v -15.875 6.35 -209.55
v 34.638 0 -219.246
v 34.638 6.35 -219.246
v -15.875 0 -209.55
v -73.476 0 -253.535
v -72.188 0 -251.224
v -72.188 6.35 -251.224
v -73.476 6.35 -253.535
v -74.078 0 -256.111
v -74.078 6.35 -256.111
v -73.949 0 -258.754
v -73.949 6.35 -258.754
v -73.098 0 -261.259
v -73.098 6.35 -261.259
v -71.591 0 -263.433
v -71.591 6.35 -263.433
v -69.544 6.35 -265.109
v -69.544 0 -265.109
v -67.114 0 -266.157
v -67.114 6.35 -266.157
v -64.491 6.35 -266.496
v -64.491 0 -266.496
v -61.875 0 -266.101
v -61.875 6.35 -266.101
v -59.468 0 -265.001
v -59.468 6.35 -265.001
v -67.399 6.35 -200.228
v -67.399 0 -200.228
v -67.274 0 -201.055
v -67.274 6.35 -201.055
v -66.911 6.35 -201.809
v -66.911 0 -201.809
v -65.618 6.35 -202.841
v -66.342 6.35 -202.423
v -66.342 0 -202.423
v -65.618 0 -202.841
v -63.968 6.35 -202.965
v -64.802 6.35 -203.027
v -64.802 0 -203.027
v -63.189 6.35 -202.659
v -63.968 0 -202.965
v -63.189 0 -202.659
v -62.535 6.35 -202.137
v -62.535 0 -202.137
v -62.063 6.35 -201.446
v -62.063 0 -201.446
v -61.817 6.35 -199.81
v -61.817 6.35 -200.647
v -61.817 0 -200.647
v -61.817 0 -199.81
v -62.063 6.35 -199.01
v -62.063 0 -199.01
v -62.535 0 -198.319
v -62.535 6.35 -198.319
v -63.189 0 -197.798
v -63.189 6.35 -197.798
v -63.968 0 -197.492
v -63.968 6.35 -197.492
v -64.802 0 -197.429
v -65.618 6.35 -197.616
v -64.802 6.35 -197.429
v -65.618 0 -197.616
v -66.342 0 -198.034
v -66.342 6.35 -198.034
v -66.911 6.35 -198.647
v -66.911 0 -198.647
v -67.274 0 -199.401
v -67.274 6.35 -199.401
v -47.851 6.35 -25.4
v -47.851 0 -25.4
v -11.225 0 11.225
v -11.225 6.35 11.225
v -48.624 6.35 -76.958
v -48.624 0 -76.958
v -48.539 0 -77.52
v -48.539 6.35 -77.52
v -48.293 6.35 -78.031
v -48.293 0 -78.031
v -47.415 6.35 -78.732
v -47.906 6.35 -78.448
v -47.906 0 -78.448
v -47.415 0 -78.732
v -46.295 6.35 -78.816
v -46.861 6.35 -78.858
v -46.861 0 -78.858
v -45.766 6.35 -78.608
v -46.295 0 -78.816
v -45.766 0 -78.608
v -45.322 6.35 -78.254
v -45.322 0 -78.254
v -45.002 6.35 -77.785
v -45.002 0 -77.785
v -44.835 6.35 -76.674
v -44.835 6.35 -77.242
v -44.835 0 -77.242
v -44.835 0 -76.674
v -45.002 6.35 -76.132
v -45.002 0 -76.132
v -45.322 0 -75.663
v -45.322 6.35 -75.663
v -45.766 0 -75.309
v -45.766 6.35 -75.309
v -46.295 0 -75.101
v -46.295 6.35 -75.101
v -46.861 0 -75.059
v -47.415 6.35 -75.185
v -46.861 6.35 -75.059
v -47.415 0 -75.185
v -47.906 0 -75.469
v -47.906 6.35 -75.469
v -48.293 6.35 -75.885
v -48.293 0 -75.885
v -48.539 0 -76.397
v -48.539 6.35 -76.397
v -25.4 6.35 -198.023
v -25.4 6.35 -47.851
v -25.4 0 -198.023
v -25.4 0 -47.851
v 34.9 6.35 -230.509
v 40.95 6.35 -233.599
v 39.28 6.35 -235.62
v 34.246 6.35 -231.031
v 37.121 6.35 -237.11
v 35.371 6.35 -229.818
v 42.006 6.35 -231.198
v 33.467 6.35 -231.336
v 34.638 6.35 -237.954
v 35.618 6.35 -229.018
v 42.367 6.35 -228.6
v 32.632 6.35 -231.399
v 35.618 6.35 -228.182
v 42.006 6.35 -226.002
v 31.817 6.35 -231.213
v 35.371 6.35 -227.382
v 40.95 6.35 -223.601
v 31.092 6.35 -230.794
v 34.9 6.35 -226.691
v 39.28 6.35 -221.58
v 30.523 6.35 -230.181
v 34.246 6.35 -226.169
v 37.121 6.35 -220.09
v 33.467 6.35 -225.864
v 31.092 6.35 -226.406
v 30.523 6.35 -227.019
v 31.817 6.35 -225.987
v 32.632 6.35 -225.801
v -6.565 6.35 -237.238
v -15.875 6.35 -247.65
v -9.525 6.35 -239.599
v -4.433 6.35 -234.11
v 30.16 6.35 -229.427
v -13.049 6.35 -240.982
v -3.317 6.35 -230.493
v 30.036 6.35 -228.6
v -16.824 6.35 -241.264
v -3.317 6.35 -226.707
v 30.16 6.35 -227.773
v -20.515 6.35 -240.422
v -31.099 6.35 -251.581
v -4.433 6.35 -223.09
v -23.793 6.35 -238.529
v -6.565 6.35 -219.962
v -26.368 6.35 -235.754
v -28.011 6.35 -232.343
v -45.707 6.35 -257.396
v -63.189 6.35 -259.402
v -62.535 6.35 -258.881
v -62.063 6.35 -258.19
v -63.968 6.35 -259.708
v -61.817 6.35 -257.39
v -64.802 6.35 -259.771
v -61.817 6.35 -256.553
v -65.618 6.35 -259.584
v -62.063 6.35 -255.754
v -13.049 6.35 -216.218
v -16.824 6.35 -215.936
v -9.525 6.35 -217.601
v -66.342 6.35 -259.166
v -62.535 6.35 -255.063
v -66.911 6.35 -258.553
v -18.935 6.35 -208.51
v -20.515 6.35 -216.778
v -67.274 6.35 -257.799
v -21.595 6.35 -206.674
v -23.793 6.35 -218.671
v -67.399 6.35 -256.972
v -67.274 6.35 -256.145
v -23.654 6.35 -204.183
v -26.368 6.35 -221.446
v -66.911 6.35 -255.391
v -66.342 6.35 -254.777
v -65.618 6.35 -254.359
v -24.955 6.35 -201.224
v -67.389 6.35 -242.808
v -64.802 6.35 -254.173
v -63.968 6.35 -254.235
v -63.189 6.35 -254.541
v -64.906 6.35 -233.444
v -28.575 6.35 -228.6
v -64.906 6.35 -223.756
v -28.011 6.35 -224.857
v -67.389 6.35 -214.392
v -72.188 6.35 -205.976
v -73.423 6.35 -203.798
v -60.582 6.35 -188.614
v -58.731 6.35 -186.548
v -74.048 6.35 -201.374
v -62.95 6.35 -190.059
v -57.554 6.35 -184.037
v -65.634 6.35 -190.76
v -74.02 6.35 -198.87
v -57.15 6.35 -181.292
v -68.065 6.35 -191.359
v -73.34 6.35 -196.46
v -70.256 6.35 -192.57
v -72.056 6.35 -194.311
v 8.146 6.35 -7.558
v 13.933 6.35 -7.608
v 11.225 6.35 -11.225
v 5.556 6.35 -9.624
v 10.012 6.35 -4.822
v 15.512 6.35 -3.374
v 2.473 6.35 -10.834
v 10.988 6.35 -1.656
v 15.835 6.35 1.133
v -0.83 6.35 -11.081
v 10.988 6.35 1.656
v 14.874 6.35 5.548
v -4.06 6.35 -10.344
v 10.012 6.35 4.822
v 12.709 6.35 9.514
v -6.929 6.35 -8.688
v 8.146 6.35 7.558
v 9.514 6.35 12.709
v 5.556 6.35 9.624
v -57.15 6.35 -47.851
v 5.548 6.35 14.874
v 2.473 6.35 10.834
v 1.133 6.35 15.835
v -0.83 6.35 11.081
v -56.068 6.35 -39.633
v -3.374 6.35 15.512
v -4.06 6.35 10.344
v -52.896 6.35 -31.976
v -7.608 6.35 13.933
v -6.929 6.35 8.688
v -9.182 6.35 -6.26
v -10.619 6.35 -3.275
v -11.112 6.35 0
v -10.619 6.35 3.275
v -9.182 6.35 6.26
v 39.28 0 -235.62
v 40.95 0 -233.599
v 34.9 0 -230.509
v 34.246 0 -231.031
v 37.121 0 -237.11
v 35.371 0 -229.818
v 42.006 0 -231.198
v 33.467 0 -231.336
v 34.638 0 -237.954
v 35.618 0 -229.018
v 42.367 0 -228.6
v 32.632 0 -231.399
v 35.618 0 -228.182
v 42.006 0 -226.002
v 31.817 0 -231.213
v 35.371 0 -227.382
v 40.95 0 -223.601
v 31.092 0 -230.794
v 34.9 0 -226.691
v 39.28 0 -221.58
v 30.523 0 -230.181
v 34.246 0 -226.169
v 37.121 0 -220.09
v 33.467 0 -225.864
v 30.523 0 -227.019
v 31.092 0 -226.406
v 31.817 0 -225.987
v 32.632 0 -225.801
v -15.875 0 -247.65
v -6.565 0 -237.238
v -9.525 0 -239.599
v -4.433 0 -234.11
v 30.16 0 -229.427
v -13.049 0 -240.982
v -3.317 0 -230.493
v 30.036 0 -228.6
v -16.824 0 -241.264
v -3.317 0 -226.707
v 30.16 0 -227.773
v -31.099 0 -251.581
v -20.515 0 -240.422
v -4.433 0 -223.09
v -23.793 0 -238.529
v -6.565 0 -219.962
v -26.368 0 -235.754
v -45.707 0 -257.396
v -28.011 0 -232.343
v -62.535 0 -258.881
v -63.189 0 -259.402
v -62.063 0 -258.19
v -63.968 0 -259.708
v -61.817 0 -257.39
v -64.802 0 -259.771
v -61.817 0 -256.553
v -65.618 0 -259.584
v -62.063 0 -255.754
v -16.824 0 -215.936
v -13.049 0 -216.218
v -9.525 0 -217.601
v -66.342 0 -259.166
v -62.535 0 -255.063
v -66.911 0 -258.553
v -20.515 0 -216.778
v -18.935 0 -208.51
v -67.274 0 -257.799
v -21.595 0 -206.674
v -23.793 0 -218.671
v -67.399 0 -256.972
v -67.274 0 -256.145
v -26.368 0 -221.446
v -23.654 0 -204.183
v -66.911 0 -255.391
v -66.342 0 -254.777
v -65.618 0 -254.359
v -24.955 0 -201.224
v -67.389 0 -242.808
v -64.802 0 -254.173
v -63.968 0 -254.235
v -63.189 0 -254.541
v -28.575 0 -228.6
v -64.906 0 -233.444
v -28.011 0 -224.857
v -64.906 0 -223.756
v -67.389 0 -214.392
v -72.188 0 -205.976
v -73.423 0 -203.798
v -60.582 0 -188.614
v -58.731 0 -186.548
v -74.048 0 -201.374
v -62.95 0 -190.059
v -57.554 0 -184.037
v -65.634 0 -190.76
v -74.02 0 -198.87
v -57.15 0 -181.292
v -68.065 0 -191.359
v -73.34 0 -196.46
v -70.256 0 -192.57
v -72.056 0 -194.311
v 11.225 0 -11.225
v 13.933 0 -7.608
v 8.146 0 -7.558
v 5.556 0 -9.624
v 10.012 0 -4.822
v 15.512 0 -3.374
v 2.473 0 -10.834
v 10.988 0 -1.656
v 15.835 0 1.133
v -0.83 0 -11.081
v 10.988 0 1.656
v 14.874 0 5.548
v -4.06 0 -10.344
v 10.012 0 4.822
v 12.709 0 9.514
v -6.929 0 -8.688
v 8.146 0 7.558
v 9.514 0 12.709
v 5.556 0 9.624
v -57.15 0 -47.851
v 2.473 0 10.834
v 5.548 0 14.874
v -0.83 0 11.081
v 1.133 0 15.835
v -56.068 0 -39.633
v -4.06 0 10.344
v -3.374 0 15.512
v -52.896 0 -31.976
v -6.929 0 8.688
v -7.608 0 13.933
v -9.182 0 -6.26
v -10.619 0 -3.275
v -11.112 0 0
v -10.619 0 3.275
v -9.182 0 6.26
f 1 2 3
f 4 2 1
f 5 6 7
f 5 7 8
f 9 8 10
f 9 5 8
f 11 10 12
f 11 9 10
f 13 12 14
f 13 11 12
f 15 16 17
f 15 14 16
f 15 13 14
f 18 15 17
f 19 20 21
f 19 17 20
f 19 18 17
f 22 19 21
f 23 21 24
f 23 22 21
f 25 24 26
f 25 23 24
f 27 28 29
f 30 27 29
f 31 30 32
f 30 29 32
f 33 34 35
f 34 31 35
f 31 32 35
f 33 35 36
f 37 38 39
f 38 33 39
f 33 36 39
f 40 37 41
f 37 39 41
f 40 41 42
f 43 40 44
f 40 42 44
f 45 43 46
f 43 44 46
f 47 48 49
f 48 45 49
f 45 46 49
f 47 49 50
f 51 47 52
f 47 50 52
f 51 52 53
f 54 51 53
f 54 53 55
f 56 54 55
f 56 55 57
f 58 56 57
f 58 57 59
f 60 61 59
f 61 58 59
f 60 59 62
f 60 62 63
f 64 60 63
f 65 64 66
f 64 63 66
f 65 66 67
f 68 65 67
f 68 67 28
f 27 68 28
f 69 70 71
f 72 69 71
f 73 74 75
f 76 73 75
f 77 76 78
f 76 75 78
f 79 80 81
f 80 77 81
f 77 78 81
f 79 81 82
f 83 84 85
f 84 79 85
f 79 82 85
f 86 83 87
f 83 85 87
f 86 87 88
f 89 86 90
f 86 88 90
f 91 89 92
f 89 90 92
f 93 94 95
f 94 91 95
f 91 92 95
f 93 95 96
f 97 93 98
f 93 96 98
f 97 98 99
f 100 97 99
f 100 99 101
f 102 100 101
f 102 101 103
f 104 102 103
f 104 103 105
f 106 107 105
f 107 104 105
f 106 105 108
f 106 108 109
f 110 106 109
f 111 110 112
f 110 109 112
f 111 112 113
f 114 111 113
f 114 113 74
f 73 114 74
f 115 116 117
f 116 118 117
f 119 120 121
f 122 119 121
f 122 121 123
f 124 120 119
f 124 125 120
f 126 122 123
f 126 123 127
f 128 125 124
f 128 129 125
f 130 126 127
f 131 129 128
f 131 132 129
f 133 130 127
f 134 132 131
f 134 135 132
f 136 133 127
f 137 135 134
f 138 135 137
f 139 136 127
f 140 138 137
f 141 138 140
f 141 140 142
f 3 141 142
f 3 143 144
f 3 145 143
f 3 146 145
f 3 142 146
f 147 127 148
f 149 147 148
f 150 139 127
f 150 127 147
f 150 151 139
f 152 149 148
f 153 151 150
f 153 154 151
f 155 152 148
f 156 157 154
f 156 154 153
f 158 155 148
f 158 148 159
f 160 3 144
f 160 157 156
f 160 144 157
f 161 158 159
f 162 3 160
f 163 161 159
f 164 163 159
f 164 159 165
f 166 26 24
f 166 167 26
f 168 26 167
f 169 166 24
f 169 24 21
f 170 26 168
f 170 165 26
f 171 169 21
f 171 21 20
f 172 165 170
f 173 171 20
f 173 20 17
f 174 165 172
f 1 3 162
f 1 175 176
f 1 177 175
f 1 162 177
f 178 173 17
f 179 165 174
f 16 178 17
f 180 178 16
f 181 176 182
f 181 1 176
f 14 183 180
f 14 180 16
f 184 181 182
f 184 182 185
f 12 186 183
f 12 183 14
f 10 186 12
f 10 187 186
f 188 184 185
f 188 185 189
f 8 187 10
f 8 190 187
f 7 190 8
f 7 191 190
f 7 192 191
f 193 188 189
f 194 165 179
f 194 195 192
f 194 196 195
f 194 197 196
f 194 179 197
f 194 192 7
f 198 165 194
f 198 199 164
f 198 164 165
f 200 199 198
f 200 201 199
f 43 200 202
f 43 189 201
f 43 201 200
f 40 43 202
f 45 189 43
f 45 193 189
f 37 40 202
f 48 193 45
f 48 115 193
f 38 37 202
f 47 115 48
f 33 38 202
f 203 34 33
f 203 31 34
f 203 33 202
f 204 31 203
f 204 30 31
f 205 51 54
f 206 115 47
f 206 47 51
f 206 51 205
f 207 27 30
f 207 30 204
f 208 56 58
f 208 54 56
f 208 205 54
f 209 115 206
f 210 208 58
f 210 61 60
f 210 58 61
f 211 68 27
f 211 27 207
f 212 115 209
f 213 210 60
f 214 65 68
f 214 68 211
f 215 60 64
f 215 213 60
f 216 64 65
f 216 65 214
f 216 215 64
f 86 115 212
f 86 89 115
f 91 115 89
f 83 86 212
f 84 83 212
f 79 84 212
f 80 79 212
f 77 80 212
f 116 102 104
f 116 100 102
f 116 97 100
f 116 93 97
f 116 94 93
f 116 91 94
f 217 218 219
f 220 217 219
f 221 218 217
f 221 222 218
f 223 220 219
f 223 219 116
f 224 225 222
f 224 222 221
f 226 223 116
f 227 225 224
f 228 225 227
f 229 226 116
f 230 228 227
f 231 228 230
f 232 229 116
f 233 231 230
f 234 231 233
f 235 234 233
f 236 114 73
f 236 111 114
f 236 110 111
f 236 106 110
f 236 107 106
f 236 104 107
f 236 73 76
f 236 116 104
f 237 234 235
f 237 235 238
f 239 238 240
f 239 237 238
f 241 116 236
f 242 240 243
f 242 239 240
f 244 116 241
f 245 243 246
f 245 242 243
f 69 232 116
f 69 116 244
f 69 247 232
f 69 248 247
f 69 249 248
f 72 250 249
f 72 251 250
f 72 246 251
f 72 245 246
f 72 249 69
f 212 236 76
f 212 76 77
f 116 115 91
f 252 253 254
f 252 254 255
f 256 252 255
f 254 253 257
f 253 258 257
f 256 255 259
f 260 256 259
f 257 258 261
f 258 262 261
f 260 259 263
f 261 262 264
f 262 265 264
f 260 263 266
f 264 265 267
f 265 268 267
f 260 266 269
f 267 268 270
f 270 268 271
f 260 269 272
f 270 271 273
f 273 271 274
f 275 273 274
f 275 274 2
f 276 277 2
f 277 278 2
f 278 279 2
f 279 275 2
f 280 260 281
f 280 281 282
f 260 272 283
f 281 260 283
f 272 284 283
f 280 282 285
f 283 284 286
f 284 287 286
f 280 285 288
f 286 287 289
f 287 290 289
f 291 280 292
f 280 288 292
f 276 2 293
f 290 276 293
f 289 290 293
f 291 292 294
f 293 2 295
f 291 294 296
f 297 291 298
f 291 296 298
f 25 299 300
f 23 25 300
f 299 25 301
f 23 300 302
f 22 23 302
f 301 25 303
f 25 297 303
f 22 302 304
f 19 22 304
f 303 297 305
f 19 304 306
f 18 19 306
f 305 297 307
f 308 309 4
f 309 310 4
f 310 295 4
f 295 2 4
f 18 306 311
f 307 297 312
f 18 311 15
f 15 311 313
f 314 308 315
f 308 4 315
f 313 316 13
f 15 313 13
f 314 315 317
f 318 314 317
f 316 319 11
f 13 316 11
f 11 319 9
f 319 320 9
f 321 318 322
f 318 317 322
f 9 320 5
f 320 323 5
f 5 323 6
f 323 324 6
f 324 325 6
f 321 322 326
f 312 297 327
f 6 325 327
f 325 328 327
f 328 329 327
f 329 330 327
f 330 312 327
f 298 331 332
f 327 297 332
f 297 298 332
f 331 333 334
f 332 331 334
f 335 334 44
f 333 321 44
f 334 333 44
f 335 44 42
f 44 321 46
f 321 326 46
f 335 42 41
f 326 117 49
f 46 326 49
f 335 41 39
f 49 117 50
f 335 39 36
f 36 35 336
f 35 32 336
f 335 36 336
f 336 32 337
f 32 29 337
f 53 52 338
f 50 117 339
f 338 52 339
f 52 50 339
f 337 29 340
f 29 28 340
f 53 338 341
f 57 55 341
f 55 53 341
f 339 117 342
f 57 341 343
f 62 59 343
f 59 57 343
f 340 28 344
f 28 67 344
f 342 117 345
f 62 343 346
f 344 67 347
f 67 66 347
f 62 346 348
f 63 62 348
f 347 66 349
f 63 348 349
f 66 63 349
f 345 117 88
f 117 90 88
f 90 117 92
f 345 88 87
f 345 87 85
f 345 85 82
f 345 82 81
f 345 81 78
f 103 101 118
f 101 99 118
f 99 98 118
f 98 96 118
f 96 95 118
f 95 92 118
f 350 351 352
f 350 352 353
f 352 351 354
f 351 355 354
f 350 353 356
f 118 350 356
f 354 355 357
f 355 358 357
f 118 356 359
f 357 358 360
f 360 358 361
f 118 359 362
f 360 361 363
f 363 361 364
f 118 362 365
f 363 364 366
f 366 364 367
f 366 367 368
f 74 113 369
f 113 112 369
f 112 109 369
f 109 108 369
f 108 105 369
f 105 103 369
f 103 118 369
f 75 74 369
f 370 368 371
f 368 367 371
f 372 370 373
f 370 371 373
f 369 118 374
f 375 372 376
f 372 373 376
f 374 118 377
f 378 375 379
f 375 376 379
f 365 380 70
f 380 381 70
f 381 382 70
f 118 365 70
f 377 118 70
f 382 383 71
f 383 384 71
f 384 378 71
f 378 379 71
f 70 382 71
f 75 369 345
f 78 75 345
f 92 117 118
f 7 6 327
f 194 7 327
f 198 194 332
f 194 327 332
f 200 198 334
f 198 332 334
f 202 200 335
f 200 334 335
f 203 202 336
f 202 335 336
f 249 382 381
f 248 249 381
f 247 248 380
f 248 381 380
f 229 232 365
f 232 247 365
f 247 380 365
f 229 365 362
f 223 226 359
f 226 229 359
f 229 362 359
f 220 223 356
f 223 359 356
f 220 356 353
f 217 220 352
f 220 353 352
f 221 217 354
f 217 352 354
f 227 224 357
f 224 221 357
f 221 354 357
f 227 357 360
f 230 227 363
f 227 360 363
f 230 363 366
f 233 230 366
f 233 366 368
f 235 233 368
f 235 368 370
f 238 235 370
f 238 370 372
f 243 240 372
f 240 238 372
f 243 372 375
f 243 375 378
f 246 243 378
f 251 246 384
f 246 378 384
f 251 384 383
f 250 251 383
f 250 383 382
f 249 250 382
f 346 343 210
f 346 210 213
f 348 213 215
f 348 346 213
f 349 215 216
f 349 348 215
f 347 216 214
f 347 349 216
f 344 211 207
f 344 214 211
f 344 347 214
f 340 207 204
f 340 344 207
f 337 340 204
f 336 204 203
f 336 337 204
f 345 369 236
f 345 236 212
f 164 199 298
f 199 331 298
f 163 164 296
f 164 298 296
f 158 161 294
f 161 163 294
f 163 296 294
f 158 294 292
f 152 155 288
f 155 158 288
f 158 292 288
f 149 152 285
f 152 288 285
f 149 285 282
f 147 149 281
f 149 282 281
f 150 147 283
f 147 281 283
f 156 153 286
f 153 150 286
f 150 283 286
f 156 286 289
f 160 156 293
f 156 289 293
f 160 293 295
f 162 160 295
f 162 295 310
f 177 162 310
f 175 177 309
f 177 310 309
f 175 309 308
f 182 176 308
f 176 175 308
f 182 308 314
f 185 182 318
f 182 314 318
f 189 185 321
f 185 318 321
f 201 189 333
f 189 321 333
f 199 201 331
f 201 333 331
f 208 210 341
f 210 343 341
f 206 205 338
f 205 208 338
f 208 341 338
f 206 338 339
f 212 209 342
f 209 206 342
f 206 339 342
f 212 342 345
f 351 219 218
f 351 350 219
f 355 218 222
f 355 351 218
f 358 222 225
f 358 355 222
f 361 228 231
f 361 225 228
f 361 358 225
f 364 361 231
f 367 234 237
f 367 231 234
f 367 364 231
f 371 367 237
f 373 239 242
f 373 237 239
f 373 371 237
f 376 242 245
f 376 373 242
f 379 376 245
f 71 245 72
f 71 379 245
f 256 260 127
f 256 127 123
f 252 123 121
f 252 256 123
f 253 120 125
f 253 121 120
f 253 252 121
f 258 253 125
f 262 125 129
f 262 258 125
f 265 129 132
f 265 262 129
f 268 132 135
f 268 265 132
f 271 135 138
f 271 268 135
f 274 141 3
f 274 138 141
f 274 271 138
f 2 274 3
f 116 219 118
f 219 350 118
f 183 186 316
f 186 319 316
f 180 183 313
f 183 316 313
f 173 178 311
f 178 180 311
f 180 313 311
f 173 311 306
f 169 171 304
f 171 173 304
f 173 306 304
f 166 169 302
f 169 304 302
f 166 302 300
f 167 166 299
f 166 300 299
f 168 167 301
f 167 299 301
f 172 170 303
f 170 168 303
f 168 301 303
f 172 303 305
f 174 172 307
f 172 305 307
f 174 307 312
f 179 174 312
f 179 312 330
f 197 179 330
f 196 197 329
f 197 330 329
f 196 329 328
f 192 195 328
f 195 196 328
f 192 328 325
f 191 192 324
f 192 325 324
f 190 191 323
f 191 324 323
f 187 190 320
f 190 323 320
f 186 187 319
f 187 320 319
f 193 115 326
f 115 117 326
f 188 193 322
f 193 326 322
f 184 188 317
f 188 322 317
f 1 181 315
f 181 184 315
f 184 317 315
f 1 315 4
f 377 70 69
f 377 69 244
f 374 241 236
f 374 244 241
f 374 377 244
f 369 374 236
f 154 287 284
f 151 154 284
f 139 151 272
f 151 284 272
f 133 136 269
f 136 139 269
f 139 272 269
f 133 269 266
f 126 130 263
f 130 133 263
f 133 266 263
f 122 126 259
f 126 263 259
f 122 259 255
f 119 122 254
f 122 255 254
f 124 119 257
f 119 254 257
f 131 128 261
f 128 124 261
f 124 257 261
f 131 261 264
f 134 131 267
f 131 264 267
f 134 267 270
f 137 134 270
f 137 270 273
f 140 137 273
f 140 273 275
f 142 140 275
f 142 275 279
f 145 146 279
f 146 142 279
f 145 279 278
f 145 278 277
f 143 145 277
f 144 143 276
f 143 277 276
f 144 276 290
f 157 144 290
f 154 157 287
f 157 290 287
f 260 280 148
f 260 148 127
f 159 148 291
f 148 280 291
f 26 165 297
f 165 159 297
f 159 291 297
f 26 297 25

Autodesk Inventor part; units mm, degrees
ref_plane "YZ Plane" through (0, 0, 0) normal (1, 0, 0) x (0, 1, 0)
ref_plane "XZ Plane" through (0, 0, 0) normal (0, 1, 0) x (-1, 0, 0)
ref_plane "XY Plane" through (0, 0, 0) normal (0, 0, 1) x (1, 0, 0)
sketch "Sketch1" plane through (0, 0, 0) normal (0, 1, 0) x (-1, 0, 0)
  circle A0 centre (0, 0) radius 11.1125
  line L0 (0, -228.6) -> (0, 0) construction
  line L1 (15.875, -228.6) -> (0, -228.6) construction
  circle A1 centre (15.875, -228.6) radius 12.7
  line L2 (25.4, -47.8506) -> (25.4, -198.0228)
  line L3 (57.15, -47.8506) -> (57.15, -181.2924)
  arc A2 (11.2253, 11.2253) -> (-11.2253, -11.2253) centre (0, 0) ccw
  line L4 (-11.2253, -11.2253) -> (25.4, -47.8506)
  arc A3 (57.15, -47.8506) -> (47.8506, -25.4) centre (25.4, -47.8506) ccw
  line L5 (47.8506, -25.4) -> (11.2253, 11.2253)
  circle A4 centre (64.5922, -200.2282) radius 2.8067
  circle A5 centre (64.5922, -256.9718) radius 2.8067
  line L6 (64.5922, -256.9718) -> (64.5922, -200.2282) construction
  line L7 (15.875, -228.6) -> (64.5922, -228.6) construction
  line L8 (15.875, -228.6) -> (-32.8422, -228.6) construction
  circle A6 centre (-32.8422, -228.6) radius 2.8067
  arc A7 (-34.6377, -219.2458) -> (-34.6377, -237.9542) centre (-32.8422, -228.6) ccw
  arc A8 (59.4685, -265.0013) -> (72.1876, -251.2241) centre (64.5922, -256.9718) ccw
  arc A9 (72.1876, -205.9759) -> (65.6336, -190.7603) centre (64.5922, -200.2282) ccw
  line L9 (15.875, -247.65) -> (-34.6377, -237.9542)
  line L10 (15.875, -247.65) -> (15.875, -228.6) construction
  arc A10 (59.4685, -265.0013) -> (15.875, -247.65) centre (-7.6434, -370.1755) ccw
  arc A11 (72.1876, -205.9759) -> (72.1876, -251.2241) centre (102.0848, -228.6) ccw
  arc A12 (57.15, -181.2924) -> (65.6336, -190.7603) centre (66.675, -181.2924) ccw
  line L11 (-34.6377, -219.2458) -> (15.875, -209.55)
  arc A13 (15.875, -209.55) -> (25.4, -198.0228) centre (13.6624, -198.0228) ccw
  line L12 (15.875, -228.6) -> (15.875, -209.55) construction
  line L13 (15.875, -228.6) -> (0, 0) construction
  line L14 (5.5429, -79.8178) -> (46.7187, -76.9583) construction
  circle A14 centre (46.7187, -76.9583) radius 1.905
  line L15 (74.1172, -266.4968) -> (-42.3672, -266.4968) construction
  line L16 (-42.3672, -266.4968) -> (-42.3672, 15.875) construction
  line L17 (-42.3672, 15.875) -> (74.1172, 15.875) construction
  line L18 (74.1172, 15.875) -> (74.1172, -266.4968) construction
  dimension "d0" = 22.225
  dimension "d2" = 228.6
  dimension "d7" = 25.4
  dimension "d17" = 31.75
  dimension "d18" = 45
  dimension "d20" = 25.4
  dimension "d21" = 56.7436
  dimension "d22" = 5.6134
  dimension "d23" = 48.7172
  dimension "d24" = 48.7172
  dimension "d25" = 9.525
  dimension "d26" = 19.05
  dimension "d27" = 19.05
  dimension "d28" = 15.875
  dimension "d29" = 3.81
  dimension "d31" = 41.275
  dimension "d32" = 80.01
  dimension "d33" = 282.3718
  dimension "d34" = 116.4844
extrude "Extrusion1" add sketch "Sketch1" along normal blind 6.35
equation "\"d24\" = d23"
equation "\"d27\" = d26"
properties part number "Intake Arms"
